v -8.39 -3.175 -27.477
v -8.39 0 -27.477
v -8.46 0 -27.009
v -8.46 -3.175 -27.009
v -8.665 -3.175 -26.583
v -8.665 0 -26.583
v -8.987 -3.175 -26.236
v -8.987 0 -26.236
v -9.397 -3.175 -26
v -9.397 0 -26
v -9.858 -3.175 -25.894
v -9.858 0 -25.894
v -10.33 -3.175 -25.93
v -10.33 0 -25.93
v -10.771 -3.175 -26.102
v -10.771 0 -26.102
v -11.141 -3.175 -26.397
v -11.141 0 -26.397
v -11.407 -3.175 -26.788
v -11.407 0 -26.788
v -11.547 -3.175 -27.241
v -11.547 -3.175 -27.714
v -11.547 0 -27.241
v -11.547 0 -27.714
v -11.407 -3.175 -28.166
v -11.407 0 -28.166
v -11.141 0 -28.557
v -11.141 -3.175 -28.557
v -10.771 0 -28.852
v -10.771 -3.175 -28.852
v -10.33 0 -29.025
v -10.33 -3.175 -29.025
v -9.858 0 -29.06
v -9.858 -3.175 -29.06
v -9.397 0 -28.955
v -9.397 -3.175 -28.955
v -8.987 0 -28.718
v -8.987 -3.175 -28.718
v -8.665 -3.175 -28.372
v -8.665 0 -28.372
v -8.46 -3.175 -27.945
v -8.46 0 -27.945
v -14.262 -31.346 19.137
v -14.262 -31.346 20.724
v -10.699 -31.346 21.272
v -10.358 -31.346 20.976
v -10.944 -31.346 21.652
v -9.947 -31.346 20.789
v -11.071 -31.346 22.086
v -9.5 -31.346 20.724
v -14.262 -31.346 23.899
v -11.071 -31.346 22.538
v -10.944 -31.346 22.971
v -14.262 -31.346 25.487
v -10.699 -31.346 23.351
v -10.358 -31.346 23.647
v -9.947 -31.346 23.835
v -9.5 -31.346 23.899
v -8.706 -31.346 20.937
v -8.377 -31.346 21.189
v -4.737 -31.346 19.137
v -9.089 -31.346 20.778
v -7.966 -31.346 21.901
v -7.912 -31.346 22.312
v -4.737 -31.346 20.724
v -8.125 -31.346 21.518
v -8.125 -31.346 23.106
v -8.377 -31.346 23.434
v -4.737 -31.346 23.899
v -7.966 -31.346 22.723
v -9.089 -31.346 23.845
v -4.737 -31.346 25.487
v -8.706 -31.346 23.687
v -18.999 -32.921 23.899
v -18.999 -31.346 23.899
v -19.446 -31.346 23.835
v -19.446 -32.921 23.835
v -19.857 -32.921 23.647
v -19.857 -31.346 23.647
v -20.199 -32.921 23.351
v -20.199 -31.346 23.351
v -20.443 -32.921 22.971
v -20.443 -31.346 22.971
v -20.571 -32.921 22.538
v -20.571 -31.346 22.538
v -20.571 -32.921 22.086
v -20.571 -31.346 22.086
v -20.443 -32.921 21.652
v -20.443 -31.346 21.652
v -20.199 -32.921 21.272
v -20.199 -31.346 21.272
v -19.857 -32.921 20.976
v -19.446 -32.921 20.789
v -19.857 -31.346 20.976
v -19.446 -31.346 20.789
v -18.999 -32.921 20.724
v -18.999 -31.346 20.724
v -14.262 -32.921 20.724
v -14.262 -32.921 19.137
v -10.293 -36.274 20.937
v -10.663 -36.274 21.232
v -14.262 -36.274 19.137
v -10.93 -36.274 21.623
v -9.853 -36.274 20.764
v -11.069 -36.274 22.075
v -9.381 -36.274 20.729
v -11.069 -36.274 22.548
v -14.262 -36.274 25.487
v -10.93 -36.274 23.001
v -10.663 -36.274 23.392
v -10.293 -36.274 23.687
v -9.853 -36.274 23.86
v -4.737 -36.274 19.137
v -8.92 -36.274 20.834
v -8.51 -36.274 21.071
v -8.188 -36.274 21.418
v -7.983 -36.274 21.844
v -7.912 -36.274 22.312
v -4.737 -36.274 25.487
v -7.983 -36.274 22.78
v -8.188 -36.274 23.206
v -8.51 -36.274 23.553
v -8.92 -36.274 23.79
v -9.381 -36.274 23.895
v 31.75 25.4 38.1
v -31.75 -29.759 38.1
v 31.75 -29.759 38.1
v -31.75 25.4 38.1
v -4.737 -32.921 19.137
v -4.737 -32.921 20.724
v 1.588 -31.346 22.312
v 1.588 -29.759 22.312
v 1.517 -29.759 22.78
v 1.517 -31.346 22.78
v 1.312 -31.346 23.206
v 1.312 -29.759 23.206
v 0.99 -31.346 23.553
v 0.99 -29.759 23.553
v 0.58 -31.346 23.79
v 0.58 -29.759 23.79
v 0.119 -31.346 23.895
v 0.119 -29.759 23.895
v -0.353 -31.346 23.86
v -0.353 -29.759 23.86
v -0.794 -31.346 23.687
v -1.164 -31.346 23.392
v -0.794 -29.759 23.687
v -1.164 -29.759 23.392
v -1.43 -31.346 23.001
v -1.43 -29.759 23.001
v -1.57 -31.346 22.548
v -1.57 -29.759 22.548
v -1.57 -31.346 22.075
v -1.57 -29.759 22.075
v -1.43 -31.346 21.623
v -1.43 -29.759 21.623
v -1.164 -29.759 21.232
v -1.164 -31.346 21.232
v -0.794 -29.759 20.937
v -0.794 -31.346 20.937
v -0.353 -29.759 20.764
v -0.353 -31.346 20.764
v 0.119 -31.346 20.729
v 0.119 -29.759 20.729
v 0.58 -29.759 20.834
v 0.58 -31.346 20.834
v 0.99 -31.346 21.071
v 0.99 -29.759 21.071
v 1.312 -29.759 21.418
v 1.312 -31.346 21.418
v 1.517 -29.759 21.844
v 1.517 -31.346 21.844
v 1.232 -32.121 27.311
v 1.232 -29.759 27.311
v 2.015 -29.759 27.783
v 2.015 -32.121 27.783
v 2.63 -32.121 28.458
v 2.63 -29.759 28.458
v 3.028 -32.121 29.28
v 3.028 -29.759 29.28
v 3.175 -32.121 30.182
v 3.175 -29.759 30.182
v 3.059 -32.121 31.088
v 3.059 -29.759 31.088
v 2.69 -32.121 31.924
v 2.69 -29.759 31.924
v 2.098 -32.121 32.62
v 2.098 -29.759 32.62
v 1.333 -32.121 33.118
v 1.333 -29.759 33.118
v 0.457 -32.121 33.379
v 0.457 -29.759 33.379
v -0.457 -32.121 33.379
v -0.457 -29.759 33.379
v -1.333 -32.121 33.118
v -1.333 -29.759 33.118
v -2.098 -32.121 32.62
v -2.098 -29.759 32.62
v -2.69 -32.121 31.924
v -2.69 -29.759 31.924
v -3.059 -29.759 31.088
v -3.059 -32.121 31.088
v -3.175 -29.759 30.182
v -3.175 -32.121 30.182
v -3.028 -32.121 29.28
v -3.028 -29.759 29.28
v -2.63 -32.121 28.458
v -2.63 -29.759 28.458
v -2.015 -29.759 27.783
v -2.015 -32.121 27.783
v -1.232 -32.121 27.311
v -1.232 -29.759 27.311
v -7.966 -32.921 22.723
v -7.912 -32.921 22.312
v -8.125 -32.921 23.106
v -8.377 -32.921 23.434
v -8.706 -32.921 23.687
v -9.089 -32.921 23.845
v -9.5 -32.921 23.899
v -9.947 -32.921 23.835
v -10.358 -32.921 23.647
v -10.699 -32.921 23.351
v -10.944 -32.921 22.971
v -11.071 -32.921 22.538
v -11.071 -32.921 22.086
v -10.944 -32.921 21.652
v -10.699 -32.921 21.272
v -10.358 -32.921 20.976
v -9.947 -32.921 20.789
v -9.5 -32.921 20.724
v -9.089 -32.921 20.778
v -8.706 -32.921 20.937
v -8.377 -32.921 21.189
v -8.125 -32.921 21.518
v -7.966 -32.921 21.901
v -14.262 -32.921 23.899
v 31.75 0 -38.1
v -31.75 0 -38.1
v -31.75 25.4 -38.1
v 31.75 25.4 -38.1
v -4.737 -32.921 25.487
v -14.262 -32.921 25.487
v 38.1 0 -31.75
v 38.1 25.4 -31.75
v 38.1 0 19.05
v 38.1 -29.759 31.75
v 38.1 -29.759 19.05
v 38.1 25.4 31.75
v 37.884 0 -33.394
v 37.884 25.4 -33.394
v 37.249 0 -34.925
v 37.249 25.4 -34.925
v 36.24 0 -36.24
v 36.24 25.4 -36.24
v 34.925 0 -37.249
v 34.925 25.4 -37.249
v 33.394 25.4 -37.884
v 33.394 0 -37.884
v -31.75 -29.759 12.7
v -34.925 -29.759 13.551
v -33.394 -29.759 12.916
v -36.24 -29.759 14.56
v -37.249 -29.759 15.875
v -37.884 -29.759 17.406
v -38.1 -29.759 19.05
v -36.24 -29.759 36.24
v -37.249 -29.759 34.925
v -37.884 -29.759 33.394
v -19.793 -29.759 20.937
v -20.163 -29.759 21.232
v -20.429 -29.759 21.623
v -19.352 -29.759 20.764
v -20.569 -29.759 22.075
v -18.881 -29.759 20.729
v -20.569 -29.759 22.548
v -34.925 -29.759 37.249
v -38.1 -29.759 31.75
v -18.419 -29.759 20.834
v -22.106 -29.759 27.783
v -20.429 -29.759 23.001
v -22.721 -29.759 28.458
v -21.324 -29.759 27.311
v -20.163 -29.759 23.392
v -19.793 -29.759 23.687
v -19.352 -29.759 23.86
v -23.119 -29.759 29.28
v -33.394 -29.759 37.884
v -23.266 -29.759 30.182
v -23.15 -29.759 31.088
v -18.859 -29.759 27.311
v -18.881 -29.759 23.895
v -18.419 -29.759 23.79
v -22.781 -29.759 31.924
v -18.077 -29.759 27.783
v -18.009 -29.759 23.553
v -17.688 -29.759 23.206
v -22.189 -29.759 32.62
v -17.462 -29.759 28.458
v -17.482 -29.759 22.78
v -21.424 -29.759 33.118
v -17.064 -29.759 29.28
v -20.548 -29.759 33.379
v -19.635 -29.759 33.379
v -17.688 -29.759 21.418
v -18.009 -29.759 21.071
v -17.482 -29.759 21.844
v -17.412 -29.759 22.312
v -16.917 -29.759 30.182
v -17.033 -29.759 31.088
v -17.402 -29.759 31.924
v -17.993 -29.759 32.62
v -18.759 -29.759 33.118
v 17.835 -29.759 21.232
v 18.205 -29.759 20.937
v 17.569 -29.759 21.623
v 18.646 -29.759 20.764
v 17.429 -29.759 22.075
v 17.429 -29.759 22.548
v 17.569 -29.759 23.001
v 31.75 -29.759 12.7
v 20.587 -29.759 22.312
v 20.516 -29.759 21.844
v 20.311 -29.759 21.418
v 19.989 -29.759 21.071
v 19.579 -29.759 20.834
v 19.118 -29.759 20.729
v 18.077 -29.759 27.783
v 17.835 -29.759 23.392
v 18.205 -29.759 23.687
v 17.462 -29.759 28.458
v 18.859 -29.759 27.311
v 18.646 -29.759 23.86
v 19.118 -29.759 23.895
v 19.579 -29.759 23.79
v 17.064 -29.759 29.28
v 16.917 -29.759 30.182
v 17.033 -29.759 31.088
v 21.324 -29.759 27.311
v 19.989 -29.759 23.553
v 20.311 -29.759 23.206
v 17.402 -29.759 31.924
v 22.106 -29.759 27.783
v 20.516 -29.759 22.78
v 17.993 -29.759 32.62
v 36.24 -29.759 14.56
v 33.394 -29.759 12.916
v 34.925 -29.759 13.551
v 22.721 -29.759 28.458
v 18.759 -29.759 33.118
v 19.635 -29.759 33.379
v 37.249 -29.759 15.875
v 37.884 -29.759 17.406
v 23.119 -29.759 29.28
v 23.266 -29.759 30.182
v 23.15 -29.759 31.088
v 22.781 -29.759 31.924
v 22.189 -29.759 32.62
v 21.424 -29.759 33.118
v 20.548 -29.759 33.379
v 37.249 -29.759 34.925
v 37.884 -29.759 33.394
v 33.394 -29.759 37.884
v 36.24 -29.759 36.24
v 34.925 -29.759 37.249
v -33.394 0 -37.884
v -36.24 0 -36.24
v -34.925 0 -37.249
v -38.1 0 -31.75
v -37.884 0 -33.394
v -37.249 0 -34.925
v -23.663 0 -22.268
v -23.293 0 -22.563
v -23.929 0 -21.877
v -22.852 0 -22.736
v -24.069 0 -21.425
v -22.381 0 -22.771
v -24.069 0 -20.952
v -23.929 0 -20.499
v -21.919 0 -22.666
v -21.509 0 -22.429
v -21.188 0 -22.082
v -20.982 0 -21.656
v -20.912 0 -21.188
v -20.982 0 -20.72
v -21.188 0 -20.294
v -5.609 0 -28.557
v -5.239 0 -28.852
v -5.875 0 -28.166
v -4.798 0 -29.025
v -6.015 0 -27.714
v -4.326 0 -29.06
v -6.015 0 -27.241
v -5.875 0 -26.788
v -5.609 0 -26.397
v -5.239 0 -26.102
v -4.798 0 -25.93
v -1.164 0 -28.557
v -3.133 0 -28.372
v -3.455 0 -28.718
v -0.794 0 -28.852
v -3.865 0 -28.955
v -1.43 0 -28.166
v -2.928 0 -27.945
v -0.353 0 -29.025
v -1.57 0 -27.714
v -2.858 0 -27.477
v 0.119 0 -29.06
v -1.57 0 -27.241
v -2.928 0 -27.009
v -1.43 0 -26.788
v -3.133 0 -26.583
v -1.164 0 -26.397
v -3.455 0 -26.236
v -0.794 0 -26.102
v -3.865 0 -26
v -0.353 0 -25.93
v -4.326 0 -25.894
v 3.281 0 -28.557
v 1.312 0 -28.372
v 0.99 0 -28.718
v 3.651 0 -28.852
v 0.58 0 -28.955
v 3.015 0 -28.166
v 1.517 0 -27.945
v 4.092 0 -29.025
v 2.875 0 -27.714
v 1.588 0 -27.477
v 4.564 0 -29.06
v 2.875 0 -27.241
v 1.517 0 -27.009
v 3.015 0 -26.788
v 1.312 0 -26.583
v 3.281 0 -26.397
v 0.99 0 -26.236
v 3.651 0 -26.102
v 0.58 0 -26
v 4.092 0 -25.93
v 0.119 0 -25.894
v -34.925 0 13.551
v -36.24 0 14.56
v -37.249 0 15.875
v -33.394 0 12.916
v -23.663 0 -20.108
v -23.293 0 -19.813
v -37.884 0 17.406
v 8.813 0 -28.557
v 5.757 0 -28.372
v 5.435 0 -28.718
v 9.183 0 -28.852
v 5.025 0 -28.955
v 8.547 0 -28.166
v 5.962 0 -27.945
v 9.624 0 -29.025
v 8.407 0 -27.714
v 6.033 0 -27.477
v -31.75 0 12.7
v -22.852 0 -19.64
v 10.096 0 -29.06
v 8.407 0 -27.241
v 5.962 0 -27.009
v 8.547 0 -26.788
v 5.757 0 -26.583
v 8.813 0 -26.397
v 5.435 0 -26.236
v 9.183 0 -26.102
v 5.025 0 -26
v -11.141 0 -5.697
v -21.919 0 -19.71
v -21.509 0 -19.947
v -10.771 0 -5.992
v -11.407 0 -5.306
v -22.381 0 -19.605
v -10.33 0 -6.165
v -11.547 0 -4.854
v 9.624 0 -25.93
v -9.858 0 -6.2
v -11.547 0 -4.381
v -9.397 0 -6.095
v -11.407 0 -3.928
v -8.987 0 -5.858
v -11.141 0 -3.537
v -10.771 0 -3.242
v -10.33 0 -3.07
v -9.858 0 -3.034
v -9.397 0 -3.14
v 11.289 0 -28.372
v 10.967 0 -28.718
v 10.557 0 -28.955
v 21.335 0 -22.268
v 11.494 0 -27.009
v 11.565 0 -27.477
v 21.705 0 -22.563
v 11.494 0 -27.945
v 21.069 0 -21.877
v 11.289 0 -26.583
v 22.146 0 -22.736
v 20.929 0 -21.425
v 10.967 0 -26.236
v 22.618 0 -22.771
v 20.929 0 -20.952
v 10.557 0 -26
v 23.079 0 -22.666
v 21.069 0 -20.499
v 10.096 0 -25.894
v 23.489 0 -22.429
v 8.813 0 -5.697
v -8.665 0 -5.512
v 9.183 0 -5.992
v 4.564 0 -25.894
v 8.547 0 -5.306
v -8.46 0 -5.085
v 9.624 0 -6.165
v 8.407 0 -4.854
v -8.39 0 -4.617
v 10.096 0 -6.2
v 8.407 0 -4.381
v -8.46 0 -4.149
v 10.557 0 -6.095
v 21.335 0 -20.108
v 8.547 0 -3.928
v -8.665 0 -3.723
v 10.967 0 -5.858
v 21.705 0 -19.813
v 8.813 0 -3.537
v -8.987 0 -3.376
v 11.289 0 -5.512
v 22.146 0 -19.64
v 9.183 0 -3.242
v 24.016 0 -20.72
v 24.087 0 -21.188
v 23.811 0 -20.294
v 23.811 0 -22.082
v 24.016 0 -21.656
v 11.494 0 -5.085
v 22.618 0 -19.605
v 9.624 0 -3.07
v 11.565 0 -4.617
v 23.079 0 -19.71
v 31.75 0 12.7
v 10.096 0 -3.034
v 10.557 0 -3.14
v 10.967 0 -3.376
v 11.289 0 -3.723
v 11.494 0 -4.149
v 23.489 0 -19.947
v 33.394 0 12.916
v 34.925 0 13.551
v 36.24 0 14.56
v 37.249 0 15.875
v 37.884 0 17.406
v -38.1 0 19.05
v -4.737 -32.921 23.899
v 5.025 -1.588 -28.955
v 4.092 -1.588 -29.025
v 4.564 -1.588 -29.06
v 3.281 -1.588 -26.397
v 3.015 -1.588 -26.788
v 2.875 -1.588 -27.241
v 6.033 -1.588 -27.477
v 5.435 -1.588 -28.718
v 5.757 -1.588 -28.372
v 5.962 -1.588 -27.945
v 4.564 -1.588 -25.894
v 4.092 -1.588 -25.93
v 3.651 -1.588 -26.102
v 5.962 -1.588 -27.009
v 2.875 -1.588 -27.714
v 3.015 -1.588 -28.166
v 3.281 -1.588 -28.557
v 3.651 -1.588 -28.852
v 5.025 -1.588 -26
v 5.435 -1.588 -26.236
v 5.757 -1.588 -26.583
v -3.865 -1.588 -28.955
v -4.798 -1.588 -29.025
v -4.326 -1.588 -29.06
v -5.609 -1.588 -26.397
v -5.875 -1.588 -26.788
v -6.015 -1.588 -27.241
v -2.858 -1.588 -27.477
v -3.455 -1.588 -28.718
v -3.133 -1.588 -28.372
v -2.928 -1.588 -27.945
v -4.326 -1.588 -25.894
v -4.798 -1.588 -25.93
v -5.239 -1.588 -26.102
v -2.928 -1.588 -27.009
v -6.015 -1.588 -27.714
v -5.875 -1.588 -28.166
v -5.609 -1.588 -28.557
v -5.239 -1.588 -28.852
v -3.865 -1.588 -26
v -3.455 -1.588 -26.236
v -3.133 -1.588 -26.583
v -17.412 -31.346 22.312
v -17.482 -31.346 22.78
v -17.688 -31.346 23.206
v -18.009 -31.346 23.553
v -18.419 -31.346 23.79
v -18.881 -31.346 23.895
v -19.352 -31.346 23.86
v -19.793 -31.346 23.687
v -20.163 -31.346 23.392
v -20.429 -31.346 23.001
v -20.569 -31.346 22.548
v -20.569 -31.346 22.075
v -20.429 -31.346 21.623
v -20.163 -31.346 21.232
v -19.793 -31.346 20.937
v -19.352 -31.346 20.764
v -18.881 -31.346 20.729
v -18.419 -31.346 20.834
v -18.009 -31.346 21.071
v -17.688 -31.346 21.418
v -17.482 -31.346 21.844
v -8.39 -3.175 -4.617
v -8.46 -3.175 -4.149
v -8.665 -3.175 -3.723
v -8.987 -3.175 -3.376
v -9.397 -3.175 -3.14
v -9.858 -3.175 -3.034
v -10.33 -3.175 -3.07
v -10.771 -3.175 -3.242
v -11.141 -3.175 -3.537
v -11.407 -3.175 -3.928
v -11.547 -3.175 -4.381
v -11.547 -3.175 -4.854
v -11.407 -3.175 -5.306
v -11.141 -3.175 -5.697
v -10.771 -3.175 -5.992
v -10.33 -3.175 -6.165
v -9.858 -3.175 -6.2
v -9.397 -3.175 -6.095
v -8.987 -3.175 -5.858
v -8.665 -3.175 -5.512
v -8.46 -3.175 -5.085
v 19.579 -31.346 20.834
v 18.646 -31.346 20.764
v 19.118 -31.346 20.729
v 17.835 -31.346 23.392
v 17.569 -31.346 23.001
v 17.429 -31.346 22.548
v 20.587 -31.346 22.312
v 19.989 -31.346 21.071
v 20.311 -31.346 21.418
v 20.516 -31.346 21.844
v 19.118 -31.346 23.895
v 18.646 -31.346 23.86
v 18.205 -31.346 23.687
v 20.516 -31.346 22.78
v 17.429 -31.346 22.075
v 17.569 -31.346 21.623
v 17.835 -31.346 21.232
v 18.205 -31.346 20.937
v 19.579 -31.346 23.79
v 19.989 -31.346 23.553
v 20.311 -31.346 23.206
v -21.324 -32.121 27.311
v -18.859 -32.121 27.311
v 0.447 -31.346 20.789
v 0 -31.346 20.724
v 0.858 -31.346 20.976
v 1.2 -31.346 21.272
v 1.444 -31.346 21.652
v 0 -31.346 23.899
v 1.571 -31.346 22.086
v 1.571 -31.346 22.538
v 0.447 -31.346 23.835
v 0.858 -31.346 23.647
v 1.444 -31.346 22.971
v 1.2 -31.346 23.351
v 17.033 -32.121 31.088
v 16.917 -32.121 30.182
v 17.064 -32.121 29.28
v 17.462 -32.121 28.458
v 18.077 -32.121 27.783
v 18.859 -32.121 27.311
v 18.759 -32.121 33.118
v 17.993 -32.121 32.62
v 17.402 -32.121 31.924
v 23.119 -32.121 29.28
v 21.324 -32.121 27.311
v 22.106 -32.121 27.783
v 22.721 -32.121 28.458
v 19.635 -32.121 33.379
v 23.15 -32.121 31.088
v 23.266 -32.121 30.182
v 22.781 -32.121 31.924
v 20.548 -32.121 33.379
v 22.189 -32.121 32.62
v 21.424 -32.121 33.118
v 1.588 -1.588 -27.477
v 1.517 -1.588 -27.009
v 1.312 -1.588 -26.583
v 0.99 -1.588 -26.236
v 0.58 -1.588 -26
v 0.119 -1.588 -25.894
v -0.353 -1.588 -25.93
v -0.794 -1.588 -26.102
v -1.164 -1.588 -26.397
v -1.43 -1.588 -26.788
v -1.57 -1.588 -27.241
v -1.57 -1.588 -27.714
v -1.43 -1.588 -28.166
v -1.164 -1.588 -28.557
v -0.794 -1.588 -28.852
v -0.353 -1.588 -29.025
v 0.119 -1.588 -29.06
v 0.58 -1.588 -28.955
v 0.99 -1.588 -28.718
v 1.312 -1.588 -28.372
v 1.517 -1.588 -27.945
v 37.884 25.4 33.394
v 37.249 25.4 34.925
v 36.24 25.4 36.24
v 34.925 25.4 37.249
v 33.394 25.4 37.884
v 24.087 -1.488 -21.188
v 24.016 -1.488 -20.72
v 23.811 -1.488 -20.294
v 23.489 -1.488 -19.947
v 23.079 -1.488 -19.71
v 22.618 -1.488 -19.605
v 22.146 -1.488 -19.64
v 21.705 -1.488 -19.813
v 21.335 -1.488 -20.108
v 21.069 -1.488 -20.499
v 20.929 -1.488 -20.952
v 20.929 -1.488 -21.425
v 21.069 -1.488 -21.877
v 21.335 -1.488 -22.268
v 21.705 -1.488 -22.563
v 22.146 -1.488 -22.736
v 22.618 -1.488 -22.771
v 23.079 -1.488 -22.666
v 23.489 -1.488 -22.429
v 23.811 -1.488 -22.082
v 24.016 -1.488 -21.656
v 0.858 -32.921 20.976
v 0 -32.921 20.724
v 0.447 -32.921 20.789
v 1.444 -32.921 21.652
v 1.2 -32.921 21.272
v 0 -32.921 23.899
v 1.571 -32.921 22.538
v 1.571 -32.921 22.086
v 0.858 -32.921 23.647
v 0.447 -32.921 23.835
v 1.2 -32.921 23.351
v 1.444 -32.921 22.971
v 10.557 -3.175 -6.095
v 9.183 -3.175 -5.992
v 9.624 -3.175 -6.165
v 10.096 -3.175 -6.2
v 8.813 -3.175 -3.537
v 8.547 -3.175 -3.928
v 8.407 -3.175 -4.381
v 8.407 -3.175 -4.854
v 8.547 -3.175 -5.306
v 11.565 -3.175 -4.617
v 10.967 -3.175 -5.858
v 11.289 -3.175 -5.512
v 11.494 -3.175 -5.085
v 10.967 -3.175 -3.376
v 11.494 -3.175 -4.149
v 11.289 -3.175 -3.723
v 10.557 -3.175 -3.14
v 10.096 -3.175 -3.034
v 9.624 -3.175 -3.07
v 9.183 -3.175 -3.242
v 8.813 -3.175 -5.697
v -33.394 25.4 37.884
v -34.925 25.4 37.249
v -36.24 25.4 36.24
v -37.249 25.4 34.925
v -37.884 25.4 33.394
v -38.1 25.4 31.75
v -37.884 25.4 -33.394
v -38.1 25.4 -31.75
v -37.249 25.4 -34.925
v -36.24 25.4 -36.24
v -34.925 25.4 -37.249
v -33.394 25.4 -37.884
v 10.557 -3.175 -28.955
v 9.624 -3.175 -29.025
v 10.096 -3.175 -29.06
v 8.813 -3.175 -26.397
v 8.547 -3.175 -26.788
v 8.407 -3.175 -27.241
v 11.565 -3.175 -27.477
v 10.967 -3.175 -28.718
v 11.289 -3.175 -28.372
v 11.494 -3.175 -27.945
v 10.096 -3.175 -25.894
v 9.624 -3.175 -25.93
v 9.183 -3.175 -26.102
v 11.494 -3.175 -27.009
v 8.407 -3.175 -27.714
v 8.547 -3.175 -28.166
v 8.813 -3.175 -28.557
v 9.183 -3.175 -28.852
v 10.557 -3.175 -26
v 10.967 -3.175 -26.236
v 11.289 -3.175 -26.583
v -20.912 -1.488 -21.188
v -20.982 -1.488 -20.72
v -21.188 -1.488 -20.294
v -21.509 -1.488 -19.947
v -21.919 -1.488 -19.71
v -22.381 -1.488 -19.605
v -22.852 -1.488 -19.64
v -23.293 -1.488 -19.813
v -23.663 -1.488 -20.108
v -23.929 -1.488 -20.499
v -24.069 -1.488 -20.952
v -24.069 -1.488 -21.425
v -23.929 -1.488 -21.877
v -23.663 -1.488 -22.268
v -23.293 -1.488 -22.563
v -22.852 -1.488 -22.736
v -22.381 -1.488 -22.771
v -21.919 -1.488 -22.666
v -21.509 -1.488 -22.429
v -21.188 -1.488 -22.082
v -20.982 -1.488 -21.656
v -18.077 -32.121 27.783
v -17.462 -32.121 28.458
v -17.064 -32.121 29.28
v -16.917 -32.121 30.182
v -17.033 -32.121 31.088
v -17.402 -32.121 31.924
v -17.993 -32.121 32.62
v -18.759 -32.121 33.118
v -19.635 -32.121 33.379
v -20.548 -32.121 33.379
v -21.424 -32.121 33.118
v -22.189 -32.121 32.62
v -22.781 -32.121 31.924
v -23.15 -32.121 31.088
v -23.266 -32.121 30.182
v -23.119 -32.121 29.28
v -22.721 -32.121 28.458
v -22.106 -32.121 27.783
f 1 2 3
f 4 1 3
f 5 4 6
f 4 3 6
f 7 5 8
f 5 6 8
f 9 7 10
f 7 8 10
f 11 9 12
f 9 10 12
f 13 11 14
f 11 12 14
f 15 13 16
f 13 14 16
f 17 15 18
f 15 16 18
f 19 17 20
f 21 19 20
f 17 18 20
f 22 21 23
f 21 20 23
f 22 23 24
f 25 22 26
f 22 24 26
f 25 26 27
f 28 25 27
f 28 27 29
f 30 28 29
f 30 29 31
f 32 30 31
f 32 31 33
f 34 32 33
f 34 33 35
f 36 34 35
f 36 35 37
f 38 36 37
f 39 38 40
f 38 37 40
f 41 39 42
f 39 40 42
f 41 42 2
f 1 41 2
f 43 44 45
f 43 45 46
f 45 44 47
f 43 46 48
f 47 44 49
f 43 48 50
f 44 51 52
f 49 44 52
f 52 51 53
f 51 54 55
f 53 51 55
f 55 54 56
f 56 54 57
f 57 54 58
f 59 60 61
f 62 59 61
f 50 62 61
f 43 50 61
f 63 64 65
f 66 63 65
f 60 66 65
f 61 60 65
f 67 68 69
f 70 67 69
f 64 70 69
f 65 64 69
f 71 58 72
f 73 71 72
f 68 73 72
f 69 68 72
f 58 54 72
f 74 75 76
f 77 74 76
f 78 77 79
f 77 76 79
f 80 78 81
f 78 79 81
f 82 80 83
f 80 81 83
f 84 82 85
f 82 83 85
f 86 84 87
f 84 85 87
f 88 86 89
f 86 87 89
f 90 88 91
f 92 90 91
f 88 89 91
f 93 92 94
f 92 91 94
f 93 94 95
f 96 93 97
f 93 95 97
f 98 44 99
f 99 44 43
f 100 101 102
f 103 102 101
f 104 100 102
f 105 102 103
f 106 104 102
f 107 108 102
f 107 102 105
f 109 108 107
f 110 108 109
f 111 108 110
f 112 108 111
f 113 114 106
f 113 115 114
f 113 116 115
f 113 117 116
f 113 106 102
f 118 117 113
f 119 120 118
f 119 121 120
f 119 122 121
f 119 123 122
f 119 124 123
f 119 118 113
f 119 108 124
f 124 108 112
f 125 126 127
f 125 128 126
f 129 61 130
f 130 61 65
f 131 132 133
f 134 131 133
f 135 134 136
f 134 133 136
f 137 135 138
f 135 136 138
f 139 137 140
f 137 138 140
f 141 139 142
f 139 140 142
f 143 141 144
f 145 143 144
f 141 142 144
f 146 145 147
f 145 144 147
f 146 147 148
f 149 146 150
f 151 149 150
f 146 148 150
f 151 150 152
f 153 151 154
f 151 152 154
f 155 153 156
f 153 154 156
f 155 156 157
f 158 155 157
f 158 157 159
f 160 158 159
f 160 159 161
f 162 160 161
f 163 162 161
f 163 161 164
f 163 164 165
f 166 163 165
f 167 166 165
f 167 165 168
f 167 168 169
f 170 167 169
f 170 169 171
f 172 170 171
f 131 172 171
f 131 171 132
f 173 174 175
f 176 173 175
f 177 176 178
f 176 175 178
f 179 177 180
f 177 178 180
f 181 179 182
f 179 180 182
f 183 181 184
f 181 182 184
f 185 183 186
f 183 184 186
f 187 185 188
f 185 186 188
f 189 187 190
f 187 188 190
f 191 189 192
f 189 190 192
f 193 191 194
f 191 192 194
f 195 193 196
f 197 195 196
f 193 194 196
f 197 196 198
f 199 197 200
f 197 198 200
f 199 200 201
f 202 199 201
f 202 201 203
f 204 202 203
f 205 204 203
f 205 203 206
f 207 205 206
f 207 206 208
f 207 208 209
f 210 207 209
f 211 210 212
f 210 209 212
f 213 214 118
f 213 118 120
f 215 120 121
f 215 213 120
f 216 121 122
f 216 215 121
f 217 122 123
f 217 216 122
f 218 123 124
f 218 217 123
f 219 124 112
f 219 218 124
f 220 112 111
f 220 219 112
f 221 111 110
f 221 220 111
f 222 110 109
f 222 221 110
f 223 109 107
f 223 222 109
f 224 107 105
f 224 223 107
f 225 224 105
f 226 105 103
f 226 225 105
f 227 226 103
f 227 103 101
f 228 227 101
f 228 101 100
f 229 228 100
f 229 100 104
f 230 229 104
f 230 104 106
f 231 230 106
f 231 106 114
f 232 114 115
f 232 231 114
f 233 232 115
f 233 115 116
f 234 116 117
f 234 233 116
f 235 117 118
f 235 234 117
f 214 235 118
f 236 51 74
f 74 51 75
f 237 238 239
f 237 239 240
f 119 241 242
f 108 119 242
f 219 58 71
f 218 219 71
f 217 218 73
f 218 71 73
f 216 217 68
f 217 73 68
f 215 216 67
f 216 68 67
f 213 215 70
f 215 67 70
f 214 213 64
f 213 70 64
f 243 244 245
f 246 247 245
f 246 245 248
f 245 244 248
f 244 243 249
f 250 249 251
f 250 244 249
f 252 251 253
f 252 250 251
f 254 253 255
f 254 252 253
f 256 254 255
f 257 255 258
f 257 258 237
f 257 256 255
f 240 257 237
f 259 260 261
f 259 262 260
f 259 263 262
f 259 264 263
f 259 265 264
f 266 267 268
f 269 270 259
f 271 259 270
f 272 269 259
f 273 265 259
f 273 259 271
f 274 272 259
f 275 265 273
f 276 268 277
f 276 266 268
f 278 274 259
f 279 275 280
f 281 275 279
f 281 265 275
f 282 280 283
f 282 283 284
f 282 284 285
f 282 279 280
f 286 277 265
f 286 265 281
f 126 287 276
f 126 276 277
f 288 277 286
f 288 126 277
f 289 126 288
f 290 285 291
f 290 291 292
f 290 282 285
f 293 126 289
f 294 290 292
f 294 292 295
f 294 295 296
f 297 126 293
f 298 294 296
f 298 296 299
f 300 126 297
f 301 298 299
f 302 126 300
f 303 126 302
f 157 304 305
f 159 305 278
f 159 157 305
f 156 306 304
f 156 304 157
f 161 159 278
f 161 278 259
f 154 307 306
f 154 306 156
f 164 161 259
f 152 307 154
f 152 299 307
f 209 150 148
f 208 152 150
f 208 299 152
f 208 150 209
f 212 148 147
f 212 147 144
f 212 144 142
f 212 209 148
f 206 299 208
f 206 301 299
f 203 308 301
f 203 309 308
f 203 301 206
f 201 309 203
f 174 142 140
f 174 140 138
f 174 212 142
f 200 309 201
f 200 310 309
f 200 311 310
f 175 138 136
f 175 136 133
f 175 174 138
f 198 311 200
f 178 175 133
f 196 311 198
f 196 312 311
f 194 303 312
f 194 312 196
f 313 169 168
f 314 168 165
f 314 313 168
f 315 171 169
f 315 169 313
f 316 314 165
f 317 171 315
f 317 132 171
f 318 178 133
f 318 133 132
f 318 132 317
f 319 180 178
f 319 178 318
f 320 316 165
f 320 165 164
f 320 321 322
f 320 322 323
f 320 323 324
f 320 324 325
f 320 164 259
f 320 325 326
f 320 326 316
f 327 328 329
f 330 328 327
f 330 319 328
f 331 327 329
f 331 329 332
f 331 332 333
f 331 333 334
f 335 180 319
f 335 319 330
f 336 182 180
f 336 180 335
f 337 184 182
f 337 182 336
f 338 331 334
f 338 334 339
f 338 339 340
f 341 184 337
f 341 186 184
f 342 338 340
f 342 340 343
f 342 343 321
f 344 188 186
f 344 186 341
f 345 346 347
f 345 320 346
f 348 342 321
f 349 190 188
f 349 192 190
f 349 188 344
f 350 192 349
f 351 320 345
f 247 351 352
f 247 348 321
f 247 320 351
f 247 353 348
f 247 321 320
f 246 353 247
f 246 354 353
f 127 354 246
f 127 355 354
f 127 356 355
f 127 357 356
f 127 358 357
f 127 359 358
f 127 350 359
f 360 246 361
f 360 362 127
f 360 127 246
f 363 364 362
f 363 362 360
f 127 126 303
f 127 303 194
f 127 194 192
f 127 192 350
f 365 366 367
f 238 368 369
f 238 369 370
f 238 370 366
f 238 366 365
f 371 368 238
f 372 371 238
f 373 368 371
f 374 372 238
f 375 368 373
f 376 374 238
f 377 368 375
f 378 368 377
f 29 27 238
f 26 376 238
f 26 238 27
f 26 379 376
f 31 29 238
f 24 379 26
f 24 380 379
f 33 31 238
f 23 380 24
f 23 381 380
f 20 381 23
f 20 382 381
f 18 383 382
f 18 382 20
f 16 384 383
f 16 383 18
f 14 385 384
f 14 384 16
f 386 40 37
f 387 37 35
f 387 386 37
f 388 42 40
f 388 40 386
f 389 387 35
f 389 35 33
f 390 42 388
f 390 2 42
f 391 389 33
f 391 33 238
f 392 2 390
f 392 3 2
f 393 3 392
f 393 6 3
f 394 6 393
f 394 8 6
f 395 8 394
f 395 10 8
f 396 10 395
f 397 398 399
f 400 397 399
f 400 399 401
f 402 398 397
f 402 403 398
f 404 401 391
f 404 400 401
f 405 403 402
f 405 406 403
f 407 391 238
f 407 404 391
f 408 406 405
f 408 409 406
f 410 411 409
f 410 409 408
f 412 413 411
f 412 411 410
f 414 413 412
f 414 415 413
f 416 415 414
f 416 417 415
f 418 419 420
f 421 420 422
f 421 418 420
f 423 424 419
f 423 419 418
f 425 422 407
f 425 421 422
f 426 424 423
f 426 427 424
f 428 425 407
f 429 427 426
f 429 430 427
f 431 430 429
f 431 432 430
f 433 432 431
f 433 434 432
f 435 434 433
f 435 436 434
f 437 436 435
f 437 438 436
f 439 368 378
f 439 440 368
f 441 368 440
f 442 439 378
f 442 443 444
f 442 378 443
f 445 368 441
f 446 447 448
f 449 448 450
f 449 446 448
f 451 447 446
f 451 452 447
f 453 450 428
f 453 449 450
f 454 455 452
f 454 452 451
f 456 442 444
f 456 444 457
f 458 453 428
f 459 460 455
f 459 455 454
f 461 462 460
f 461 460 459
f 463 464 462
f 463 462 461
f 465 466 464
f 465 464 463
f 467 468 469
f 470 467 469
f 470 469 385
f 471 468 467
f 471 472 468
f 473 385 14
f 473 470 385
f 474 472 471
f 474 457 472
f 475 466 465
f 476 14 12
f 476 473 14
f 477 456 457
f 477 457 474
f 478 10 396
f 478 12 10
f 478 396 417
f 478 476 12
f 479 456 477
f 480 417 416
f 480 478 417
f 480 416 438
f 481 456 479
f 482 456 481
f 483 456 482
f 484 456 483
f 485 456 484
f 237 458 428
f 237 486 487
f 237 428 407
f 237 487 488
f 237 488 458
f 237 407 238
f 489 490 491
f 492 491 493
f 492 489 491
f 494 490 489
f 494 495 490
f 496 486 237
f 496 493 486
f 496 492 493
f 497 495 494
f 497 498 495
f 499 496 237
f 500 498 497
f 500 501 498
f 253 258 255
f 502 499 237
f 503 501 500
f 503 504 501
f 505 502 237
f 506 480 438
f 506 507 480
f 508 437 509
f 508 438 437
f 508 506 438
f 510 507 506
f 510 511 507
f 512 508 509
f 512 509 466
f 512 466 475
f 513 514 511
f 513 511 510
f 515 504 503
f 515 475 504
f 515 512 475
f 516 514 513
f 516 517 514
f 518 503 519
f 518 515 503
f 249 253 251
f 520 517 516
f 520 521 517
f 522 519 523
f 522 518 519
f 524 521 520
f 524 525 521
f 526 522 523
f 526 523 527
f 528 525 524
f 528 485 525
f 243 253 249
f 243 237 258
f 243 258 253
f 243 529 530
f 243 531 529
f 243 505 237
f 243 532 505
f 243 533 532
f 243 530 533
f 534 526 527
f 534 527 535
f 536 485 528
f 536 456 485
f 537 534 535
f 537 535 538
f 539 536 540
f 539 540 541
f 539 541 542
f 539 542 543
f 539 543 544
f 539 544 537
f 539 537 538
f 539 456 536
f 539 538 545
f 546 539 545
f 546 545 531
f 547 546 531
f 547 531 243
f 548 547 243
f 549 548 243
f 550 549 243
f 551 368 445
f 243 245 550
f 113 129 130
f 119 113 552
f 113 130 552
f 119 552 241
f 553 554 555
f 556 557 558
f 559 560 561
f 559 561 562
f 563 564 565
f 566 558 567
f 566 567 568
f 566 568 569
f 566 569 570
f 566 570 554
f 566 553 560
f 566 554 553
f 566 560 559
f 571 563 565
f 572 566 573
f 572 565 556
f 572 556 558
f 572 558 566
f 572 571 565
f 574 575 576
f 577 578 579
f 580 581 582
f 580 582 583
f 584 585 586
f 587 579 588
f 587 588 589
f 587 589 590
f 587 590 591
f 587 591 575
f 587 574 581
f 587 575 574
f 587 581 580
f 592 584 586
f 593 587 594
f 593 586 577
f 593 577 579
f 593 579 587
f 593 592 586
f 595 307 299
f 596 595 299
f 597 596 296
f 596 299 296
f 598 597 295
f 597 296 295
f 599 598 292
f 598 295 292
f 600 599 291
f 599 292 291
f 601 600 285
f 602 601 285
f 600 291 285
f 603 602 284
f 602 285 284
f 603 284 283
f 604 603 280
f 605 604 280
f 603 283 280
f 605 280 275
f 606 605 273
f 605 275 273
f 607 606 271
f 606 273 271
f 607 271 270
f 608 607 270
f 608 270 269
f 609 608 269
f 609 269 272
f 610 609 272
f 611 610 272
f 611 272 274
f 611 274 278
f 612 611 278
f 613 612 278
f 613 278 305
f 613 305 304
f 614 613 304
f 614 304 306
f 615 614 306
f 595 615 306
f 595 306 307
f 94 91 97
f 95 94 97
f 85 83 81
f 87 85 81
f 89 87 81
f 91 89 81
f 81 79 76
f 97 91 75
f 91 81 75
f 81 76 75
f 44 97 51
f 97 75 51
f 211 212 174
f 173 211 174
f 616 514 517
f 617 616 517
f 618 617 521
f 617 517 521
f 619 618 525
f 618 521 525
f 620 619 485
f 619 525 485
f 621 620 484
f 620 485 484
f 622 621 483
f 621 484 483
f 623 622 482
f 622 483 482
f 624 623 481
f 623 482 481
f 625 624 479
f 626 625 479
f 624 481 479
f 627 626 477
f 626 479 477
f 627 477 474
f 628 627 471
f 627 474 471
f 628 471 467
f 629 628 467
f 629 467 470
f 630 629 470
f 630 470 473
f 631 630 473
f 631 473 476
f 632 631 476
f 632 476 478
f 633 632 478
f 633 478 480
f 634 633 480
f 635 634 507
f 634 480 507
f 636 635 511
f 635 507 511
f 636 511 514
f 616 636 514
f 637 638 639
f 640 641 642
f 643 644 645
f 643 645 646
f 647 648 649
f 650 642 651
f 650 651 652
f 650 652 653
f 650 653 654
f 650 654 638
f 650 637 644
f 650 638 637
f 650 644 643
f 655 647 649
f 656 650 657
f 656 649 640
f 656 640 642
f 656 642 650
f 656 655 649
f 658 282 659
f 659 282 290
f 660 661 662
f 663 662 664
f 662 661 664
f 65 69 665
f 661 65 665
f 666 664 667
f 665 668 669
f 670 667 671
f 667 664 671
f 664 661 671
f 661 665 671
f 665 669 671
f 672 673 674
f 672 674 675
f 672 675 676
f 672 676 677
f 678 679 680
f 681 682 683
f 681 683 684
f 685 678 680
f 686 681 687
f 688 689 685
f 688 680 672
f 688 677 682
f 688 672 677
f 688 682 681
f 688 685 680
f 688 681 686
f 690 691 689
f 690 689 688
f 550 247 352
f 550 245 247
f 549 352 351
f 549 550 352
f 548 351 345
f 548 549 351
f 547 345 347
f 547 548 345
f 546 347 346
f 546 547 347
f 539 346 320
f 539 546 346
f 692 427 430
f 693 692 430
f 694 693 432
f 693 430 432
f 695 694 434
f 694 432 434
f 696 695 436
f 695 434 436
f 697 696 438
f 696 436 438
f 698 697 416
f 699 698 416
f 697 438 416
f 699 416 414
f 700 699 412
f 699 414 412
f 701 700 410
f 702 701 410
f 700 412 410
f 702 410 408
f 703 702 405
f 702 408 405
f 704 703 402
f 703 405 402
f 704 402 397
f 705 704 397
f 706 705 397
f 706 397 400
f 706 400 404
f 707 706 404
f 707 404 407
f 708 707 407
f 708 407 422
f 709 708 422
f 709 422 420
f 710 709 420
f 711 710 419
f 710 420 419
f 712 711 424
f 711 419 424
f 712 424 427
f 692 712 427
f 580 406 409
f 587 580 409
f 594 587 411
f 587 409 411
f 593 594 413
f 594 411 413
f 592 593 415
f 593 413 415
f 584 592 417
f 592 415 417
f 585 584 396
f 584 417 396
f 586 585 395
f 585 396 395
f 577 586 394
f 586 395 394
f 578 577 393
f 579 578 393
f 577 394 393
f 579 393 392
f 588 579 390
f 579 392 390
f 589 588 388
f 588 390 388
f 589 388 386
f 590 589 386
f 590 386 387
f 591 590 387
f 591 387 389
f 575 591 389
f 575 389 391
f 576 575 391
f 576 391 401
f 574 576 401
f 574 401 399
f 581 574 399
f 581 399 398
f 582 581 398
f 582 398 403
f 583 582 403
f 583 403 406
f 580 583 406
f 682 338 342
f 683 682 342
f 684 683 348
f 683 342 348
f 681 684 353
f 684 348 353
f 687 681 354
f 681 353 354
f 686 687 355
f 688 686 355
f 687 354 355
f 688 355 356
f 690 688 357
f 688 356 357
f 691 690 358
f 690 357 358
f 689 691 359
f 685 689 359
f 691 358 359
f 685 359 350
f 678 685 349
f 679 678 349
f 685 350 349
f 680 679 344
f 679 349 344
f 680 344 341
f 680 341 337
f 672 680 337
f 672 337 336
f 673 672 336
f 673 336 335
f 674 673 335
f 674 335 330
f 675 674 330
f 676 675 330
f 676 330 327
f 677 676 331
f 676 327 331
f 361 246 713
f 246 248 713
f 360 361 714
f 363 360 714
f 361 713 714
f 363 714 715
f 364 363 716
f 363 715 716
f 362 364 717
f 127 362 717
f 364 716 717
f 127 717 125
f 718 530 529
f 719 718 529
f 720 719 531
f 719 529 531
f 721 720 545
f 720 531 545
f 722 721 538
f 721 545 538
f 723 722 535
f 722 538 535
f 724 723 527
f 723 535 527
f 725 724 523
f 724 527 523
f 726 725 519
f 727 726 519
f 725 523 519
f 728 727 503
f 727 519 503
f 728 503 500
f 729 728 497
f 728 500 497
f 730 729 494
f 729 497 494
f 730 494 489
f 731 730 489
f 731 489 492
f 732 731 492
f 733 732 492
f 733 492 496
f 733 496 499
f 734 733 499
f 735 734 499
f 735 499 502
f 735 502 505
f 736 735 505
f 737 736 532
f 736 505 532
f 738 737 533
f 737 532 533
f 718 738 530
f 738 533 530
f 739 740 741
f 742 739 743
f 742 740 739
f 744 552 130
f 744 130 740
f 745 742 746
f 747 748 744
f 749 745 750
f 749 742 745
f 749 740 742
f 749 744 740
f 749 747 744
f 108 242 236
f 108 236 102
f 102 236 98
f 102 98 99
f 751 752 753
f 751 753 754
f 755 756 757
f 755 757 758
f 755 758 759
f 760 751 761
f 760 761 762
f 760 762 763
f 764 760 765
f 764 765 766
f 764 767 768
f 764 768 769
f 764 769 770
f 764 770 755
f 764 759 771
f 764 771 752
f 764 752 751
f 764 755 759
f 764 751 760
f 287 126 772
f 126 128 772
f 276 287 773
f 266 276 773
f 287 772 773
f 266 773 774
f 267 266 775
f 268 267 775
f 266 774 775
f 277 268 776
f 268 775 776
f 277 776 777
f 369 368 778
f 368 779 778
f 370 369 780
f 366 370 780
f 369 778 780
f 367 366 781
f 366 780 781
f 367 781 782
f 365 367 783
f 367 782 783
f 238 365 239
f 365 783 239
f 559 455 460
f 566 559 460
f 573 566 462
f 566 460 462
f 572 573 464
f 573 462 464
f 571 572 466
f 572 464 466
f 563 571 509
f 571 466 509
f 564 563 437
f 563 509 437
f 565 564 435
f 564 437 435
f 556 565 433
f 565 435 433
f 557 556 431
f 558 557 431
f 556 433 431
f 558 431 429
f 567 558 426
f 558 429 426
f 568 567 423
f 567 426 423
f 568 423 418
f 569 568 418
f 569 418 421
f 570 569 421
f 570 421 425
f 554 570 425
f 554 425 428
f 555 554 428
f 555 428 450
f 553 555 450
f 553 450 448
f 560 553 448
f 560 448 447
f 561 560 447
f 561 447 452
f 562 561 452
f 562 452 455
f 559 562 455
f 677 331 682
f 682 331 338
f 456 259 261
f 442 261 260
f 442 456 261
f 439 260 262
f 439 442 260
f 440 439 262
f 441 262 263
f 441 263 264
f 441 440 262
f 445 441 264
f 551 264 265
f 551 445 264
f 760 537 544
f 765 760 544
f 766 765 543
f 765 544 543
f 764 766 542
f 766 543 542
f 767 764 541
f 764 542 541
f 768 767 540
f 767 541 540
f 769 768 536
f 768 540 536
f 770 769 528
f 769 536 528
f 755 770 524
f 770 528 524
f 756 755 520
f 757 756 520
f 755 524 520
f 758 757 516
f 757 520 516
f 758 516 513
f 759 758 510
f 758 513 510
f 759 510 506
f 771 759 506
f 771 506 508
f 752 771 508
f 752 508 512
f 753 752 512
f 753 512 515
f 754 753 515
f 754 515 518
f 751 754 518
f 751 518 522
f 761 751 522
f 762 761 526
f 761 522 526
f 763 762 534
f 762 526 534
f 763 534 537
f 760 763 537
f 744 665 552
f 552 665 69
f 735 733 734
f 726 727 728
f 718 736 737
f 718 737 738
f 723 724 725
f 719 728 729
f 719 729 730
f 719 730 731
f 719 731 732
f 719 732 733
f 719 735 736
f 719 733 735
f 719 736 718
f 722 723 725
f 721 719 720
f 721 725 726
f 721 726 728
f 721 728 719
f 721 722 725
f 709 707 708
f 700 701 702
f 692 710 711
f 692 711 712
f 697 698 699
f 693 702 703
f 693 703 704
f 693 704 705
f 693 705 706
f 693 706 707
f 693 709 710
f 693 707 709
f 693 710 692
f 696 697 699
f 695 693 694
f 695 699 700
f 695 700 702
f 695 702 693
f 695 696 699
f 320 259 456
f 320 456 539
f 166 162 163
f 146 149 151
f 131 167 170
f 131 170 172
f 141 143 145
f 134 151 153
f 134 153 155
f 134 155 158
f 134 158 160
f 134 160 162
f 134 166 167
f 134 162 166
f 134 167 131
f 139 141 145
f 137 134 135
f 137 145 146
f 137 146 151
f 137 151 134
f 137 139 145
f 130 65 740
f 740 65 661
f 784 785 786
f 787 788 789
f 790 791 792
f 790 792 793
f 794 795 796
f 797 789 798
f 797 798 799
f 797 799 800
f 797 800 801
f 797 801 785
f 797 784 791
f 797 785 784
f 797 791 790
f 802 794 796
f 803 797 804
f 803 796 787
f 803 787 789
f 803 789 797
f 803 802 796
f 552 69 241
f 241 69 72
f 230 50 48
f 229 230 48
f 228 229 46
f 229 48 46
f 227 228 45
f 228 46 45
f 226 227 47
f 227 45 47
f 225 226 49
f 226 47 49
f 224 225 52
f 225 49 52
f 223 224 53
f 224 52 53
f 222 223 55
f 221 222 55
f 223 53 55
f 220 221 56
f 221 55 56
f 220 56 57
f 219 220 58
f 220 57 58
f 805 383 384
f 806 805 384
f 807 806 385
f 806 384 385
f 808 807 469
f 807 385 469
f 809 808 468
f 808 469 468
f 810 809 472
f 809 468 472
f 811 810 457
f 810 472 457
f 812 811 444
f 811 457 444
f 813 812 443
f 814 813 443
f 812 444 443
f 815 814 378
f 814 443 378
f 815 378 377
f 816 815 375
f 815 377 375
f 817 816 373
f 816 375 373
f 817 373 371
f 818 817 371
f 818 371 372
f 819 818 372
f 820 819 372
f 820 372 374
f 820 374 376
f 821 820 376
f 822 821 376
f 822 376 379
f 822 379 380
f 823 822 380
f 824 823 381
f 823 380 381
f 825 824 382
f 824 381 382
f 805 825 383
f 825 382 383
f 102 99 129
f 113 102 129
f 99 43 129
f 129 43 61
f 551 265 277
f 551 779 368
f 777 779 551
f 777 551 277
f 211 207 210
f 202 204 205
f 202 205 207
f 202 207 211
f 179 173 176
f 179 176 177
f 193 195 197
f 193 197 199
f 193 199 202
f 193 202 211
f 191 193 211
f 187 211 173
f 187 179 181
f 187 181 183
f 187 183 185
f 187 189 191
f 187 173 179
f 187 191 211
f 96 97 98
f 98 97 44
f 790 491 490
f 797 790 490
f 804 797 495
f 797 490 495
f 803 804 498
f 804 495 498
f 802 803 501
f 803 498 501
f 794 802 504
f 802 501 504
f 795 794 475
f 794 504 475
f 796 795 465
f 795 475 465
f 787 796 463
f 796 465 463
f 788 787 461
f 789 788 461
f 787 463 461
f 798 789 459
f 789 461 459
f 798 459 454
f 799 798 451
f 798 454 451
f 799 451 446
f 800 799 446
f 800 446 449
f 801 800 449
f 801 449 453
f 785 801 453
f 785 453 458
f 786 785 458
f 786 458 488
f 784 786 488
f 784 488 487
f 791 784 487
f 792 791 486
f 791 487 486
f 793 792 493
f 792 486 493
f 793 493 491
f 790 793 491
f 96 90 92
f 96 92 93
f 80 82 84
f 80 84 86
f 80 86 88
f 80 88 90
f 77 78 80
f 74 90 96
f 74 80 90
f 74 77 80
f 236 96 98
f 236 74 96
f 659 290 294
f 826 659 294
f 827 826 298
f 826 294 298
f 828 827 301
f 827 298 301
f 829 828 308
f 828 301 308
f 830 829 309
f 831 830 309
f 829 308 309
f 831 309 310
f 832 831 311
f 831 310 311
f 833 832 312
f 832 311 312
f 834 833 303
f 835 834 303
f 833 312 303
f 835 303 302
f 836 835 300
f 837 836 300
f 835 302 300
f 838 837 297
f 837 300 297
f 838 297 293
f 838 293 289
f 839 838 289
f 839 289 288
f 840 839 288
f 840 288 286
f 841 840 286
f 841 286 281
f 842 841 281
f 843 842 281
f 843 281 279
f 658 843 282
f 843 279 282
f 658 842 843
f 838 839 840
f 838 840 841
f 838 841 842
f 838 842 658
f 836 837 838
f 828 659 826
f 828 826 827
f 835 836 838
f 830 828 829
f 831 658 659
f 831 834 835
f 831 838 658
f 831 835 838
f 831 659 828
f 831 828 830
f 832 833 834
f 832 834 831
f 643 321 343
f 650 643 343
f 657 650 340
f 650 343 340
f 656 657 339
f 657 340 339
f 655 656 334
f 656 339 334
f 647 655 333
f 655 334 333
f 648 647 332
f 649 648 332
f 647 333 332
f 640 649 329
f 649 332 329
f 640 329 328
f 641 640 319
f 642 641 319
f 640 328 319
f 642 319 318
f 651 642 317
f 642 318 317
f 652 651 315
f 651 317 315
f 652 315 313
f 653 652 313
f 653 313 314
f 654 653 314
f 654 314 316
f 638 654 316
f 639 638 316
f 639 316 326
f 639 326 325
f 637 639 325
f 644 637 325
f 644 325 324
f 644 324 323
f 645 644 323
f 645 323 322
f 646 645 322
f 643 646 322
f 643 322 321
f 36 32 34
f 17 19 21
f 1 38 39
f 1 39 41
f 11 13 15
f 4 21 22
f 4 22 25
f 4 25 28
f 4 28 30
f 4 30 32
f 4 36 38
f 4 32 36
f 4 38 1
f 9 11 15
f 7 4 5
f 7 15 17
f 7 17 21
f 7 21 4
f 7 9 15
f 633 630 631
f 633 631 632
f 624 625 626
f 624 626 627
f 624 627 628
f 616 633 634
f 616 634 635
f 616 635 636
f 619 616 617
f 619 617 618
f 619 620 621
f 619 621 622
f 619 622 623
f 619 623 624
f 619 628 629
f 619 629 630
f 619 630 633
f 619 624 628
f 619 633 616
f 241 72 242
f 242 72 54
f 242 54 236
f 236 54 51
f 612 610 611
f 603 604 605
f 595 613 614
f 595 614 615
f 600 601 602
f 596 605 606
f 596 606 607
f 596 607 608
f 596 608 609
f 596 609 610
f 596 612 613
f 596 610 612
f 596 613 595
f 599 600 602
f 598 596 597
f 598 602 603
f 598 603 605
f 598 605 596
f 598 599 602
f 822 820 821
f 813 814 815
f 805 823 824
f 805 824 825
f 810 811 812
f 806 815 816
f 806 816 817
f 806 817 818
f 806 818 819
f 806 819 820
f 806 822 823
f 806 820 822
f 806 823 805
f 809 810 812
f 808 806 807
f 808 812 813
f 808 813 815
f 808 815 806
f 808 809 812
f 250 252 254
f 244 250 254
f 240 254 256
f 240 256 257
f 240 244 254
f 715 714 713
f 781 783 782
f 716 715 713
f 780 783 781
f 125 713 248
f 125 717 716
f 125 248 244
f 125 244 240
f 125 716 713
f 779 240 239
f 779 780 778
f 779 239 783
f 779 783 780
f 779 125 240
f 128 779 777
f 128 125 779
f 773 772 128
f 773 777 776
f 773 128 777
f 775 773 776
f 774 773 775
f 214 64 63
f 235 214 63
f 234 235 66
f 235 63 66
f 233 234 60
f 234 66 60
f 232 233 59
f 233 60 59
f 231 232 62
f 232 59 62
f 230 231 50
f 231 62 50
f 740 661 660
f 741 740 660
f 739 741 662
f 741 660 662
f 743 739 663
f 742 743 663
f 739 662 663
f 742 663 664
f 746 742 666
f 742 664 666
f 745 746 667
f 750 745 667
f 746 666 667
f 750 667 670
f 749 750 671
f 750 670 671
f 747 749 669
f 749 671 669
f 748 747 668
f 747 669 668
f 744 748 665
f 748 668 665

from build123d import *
from build123d import SkipClean  # not in build123d's __all__

# Parameters (mm, degrees)
F0_W      = 76.2
F0_H      = 38.1
F0_R      = 1.5875
F1_DEPTH  = 25.4
F2_R      = 1.5875
F3_DEPTH  = 1.5875
F4_R      = 1.5875
F5_DEPTH  = 31.34614
F6_W      = 76.2
F6_H      = 38.1
F7_DEPTH  = 29.75864
F8_R      = 1.5875
F9_DEPTH  = 1.5875
F10_R     = 1.5875
F11_DEPTH = 25.4
F12_W     = 76.2
F12_H     = 12.7
F13_DEPTH = 29.75864
F14_R     = 6.35
F16_DEPTH = 1.5748
F17_R     = 1.5875
F18_DEPTH = 4.9276
F19_R     = 1.5875
F20_DEPTH = 1.5875
F22_DEPTH = 2.3622
F23_R     = 1.5875
F24_DEPTH = 1.488


# Not quite as in the source:
# - a feature names something its author has since deleted; it is built from what else it names


with BuildPart() as f1:
    # F0 (on Front) → F1 (new body)
    with BuildSketch(Plane.XZ):
        with Locations((0, -19.05)):
            Rectangle(F0_W, F0_H)
        with Locations((-9.97712, -27.4772621454)):
            Circle(F0_R, mode=Mode.SUBTRACT)
        with Locations((-4.445, -27.4772621454)):
            Circle(F0_R, mode=Mode.SUBTRACT)
        with Locations((-9.97712, -4.6172621454)):
            Circle(F0_R, mode=Mode.SUBTRACT)
        with Locations((4.445, -27.4772621454)):
            Circle(F0_R, mode=Mode.SUBTRACT)
        with Locations((9.97712, -27.4772621454)):
            Circle(F0_R, mode=Mode.SUBTRACT)
        with Locations((9.97712, -4.6172621454)):
            Circle(F0_R, mode=Mode.SUBTRACT)
        with Locations((0, 19.05)):
            Rectangle(F0_W, F0_H)
        with Locations((-18.9992, 22.3118178546)):
            Circle(F0_R, mode=Mode.SUBTRACT)
        with Locations((0, 22.3118178546)):
            Circle(F0_R, mode=Mode.SUBTRACT)
        with Locations((18.9992, 22.3118178546)):
            Circle(F0_R, mode=Mode.SUBTRACT)
    extrude(amount=-F1_DEPTH)

    # F2 (on Front) → F3 (join)
    with BuildSketch(Plane.XZ):
        with Locations((9.97712, -4.6172621454)):
            Circle(F2_R)
        with Locations((-9.97712, -4.6172621454)):
            Circle(F2_R)
        with Locations((-9.97712, -27.4772621454)):
            Circle(F2_R)
        with Locations((-4.445, -27.4772621454)):
            Circle(F2_R)
        with Locations((4.445, -27.4772621454)):
            Circle(F2_R)
        with Locations((9.97712, -27.4772621454)):
            Circle(F2_R)
    extrude(amount=F3_DEPTH)

    # F4 (on Front) → F5 (join)
    with BuildSketch(Plane.XZ):
        with Locations((-18.9992, 22.3118178546)):
            Circle(F4_R)
        with Locations((0, 22.3118178546)):
            Circle(F4_R)
        with Locations((18.9992, 22.3118178546)):
            Circle(F4_R)
    extrude(amount=F5_DEPTH)

    # F6 (on Front) → F7 (join)
    with BuildSketch(Plane.XZ):
        with Locations((0, 19.05)):
            Rectangle(F6_W, F6_H)
    extrude(amount=F7_DEPTH)

    # F8 (on face) → F9 (join)
    with BuildSketch(Plane.XZ.offset(1.5875)):
        with Locations((-9.97712, -4.6172621454)):
            Circle(F8_R)
        with Locations((-9.97712, -27.4772621454)):
            Circle(F8_R)
        with Locations((9.97712, -27.4772621454)):
            Circle(F8_R)
        with Locations((9.97712, -4.6172621454)):
            Circle(F8_R)
    extrude(amount=F9_DEPTH)

    # F10 (on face) → F11 (join, through all)
    with BuildSketch(Plane(origin=(0, 25.4, 0), x_dir=(-1, 0, 0), z_dir=(0, 1, 0))):
        with Locations((9.97712, -27.4772621454)):
            Circle(F10_R)
        with Locations((4.445, -27.4772621454)):
            Circle(F10_R)
        with Locations((-4.445, -27.4772621454)):
            Circle(F10_R)
        with Locations((-9.97712, -27.4772621454)):
            Circle(F10_R)
        with Locations((9.97712, -4.6172621454)):
            Circle(F10_R)
        with Locations((-9.97712, -4.6172621454)):
            Circle(F10_R)
        with Locations((18.9992, 22.3118178546)):
            Circle(F10_R)
        with Locations((0, 22.3118178546)):
            Circle(F10_R)
        with Locations((-18.9992, 22.3118178546)):
            Circle(F10_R)
    extrude(amount=-F11_DEPTH)

    # F12 (on face) → F13 (cut, through all)
    with BuildSketch(Plane.XZ.offset(29.75864)):
        with Locations((0, 6.35)):
            Rectangle(F12_W, F12_H)
    extrude(amount=-F13_DEPTH, mode=Mode.SUBTRACT)

    # F14
    f14_edges = [f1.edges().sort_by_distance(p)[0] for p in [
        (-38.1, 12.7, -38.1),
        (38.1, 12.7, -38.1),
        (38.1, -14.87932, 12.7),
        (38.1, -2.17932, 38.1),
        (-38.1, -14.87932, 12.7),
        (-38.1, -2.17932, 38.1),
    ]]
    fillet(f14_edges, radius=F14_R)

    # F19 (on face) → F20 (join)
    with BuildSketch(Plane.XZ):
        with Locations((0, -27.4772621454)):
            Circle(F19_R)
    extrude(amount=F20_DEPTH)

    # F21 (on face) → F22 (join)
    with BuildSketch(Plane.XZ.offset(29.75864)):
        with BuildLine():
            ThreePointArc((21.3237476918, 27.3105378546), (20.0914, 33.4116178546), (18.8590523082, 27.3105378546))
            Line((18.8590523082, 27.3105378546), (21.3237476918, 27.3105378546))
        make_face()
        with BuildLine():
            Line((-21.3237476918, 27.3105378546), (-18.8590523082, 27.3105378546))
            ThreePointArc((-18.8590523082, 27.3105378546), (-20.0914, 33.4116178546), (-21.3237476918, 27.3105378546))
        make_face()
        with BuildLine():
            Line((-1.2323476918, 27.3105378546), (1.2323476918, 27.3105378546))
            ThreePointArc((1.2323476918, 27.3105378546), (0, 33.4116178546), (-1.2323476918, 27.3105378546))
        make_face()
    extrude(amount=F22_DEPTH)

    # F23 (on face) → F24 (join)
    with BuildSketch(Plane.XZ):
        with Locations((-22.4992, -21.1881821454)):
            Circle(F23_R)
        with Locations((22.4992, -21.1881821454)):
            Circle(F23_R)
    extrude(amount=F24_DEPTH)


with BuildPart() as f16:
    # F15 (on face) → F16 (new body)
    with BuildSketch(Plane.XZ.offset(31.34614)):
        with BuildLine():
            Line((-14.2621, 19.1368178546), (-9.4996, 19.1368178546))
            Line((-9.4996, 19.1368178546), (-9.4996, 20.7243178546))
            ThreePointArc((-9.4996, 20.7243178546), (-11.0871, 22.3118178546), (-9.4996, 23.8993178546))
            Line((-9.4996, 23.8993178546), (-9.4996, 25.4868178546))
            Line((-9.4996, 25.4868178546), (-14.2621, 25.4868178546))
            Line((-14.2621, 25.4868178546), (-14.2621, 23.8993178546))
            Line((-14.2621, 23.8993178546), (-18.9992, 23.8993178546))
            ThreePointArc((-18.9992, 23.8993178546), (-17.8766679849, 23.4343498698), (-17.4117, 22.3118178546))
            ThreePointArc((-17.4117, 22.3118178546), (-17.8766679849, 21.1892858395), (-18.9992, 20.7243178546))
            Line((-18.9992, 20.7243178546), (-14.2621, 20.7243178546))
            Line((-14.2621, 20.7243178546), (-14.2621, 19.1368178546))
        make_face()
        with BuildLine():
            Line((-4.7371, 20.7243178546), (0, 20.7243178546))
            ThreePointArc((0, 20.7243178546), (1.5875, 22.3118178546), (0, 23.8993178546))
            Line((0, 23.8993178546), (-4.7371, 23.8993178546))
            Line((-4.7371, 23.8993178546), (-4.7371, 25.4868178546))
            Line((-4.7371, 25.4868178546), (-9.4996, 25.4868178546))
            Line((-9.4996, 25.4868178546), (-9.4996, 23.8993178546))
            ThreePointArc((-9.4996, 23.8993178546), (-8.3770679849, 23.4343498698), (-7.9121, 22.3118178546))
            ThreePointArc((-7.9121, 22.3118178546), (-8.3770679849, 21.1892858395), (-9.4996, 20.7243178546))
            Line((-9.4996, 20.7243178546), (-9.4996, 19.1368178546))
            Line((-9.4996, 19.1368178546), (-4.7371, 19.1368178546))
            Line((-4.7371, 19.1368178546), (-4.7371, 20.7243178546))
        make_face()
        with BuildLine():
            ThreePointArc((-18.9992, 23.8993178546), (-20.5867, 22.3118178546), (-18.9992, 20.7243178546))
            ThreePointArc((-18.9992, 20.7243178546), (-17.8766679849, 21.1892858395), (-17.4117, 22.3118178546))
            ThreePointArc((-17.4117, 22.3118178546), (-17.8766679849, 23.4343498698), (-18.9992, 23.8993178546))
        make_face()
    extrude(amount=F16_DEPTH)

    # F17 (on face) → F18 (join)
    with BuildSketch(Plane.XZ.offset(31.34614)):
        Polygon((-4.7371, 23.8993178546), (-4.7371, 25.4868178546), (-14.2621, 25.4868178546), (-14.2621, 23.8993178546), (-14.2621, 20.7243178546), (-14.2621, 19.1368178546), (-4.7371, 19.1368178546), (-4.7371, 20.7243178546), align=None)
        with Locations((-9.4996, 22.3118178546)):
            Circle(F17_R, mode=Mode.SUBTRACT)
    with SkipClean():  # cleaning this boolean's faces spoils the solid; the shape is the same uncleaned
        extrude(amount=F18_DEPTH)


solid = Compound([f1.part, f16.part])
